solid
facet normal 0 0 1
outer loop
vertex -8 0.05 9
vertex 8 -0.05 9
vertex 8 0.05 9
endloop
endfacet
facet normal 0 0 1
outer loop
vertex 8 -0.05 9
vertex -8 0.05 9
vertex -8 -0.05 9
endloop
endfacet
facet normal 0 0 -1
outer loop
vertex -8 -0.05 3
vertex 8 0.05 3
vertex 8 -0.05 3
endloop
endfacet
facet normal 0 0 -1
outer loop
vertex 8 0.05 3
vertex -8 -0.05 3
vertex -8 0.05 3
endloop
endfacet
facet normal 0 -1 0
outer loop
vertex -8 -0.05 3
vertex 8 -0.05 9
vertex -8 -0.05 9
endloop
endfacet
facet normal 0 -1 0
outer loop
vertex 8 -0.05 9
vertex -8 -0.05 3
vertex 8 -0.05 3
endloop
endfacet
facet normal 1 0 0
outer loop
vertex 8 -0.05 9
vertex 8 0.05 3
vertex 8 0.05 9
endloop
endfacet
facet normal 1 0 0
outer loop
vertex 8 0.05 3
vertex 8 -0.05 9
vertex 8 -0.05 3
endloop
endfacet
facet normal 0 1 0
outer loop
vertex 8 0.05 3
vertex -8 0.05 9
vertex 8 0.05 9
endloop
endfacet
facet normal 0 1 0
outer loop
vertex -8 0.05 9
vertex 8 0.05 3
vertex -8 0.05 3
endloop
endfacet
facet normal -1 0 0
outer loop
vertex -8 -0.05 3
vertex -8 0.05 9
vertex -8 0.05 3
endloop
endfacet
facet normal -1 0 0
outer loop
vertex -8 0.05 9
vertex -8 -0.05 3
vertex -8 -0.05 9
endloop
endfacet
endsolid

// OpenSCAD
use <lib.scad>

//module corvettePlatform() {
//	translate([0,0,0.5]) box([30,15,1]);
//}
//
//corvettePlatform();
//
//module destroyerPlatform() {
//	translate([0,0,0.5]) box([60,30,1]);
//}
//
//destoyerPlatform();

module shipyard1Frame() {
	translate([0,0,0]) rotate([90,0,0]) union() {
		difference() {
			cyl(18,18,1,$fn=32);
			cyl(17,17,2,$fn=32);
			translate([9,0,0]) box([20,50,20]);
			translate([0,-10,0]) box([50,20,20]);
		}
		translate([0,17.5,0]) rotate([0,45,0]) rotate([90,0,0]) difference() {
			cyl(4,4,1,$fn=8);
			translate([0,3.98,0]) box([8,8,8]);
			translate([3.98,0,0]) box([8,8,8]);
		}
	}
}

module shipyard1Frames() {
	rotate([0,0,45]) shipyard1Frame();
	rotate([0,0,-45]) shipyard1Frame();
	rotate([0,0,135]) shipyard1Frame();
	rotate([0,0,-135]) shipyard1Frame();
}

module shipyard1Lift() {
	translate([0,0,1.5]) cyl(12,12,1,$fn=8);
}

module shipyard1Screen() {
	translate([0,0,6]) box([16,0.1,6]);
}

module shipyard1() {
	difference() {
		hull() {
			translate([0,0,1]) box([30,30,2]);
			translate([0,0,9]) cyl(13,13,1,$fn=8);
		}
		translate([0,0,6]) cyl(12,12,10,$fn=8);
		rotate([0,0,45]) translate([16,0,8]) box([4,2,15]);
		rotate([0,0,135]) translate([16,0,8]) box([4,2,15]);
		rotate([0,0,-45]) translate([16,0,8]) box([4,2,15]);
		rotate([0,0,-135]) translate([16,0,8]) box([4,2,15]);
		translate([0,15,2]) box([2,4,2]);
	}
}

//shipyard1();
//shipyard1Lift();
//shipyard1Frames();
shipyard1Screen();
